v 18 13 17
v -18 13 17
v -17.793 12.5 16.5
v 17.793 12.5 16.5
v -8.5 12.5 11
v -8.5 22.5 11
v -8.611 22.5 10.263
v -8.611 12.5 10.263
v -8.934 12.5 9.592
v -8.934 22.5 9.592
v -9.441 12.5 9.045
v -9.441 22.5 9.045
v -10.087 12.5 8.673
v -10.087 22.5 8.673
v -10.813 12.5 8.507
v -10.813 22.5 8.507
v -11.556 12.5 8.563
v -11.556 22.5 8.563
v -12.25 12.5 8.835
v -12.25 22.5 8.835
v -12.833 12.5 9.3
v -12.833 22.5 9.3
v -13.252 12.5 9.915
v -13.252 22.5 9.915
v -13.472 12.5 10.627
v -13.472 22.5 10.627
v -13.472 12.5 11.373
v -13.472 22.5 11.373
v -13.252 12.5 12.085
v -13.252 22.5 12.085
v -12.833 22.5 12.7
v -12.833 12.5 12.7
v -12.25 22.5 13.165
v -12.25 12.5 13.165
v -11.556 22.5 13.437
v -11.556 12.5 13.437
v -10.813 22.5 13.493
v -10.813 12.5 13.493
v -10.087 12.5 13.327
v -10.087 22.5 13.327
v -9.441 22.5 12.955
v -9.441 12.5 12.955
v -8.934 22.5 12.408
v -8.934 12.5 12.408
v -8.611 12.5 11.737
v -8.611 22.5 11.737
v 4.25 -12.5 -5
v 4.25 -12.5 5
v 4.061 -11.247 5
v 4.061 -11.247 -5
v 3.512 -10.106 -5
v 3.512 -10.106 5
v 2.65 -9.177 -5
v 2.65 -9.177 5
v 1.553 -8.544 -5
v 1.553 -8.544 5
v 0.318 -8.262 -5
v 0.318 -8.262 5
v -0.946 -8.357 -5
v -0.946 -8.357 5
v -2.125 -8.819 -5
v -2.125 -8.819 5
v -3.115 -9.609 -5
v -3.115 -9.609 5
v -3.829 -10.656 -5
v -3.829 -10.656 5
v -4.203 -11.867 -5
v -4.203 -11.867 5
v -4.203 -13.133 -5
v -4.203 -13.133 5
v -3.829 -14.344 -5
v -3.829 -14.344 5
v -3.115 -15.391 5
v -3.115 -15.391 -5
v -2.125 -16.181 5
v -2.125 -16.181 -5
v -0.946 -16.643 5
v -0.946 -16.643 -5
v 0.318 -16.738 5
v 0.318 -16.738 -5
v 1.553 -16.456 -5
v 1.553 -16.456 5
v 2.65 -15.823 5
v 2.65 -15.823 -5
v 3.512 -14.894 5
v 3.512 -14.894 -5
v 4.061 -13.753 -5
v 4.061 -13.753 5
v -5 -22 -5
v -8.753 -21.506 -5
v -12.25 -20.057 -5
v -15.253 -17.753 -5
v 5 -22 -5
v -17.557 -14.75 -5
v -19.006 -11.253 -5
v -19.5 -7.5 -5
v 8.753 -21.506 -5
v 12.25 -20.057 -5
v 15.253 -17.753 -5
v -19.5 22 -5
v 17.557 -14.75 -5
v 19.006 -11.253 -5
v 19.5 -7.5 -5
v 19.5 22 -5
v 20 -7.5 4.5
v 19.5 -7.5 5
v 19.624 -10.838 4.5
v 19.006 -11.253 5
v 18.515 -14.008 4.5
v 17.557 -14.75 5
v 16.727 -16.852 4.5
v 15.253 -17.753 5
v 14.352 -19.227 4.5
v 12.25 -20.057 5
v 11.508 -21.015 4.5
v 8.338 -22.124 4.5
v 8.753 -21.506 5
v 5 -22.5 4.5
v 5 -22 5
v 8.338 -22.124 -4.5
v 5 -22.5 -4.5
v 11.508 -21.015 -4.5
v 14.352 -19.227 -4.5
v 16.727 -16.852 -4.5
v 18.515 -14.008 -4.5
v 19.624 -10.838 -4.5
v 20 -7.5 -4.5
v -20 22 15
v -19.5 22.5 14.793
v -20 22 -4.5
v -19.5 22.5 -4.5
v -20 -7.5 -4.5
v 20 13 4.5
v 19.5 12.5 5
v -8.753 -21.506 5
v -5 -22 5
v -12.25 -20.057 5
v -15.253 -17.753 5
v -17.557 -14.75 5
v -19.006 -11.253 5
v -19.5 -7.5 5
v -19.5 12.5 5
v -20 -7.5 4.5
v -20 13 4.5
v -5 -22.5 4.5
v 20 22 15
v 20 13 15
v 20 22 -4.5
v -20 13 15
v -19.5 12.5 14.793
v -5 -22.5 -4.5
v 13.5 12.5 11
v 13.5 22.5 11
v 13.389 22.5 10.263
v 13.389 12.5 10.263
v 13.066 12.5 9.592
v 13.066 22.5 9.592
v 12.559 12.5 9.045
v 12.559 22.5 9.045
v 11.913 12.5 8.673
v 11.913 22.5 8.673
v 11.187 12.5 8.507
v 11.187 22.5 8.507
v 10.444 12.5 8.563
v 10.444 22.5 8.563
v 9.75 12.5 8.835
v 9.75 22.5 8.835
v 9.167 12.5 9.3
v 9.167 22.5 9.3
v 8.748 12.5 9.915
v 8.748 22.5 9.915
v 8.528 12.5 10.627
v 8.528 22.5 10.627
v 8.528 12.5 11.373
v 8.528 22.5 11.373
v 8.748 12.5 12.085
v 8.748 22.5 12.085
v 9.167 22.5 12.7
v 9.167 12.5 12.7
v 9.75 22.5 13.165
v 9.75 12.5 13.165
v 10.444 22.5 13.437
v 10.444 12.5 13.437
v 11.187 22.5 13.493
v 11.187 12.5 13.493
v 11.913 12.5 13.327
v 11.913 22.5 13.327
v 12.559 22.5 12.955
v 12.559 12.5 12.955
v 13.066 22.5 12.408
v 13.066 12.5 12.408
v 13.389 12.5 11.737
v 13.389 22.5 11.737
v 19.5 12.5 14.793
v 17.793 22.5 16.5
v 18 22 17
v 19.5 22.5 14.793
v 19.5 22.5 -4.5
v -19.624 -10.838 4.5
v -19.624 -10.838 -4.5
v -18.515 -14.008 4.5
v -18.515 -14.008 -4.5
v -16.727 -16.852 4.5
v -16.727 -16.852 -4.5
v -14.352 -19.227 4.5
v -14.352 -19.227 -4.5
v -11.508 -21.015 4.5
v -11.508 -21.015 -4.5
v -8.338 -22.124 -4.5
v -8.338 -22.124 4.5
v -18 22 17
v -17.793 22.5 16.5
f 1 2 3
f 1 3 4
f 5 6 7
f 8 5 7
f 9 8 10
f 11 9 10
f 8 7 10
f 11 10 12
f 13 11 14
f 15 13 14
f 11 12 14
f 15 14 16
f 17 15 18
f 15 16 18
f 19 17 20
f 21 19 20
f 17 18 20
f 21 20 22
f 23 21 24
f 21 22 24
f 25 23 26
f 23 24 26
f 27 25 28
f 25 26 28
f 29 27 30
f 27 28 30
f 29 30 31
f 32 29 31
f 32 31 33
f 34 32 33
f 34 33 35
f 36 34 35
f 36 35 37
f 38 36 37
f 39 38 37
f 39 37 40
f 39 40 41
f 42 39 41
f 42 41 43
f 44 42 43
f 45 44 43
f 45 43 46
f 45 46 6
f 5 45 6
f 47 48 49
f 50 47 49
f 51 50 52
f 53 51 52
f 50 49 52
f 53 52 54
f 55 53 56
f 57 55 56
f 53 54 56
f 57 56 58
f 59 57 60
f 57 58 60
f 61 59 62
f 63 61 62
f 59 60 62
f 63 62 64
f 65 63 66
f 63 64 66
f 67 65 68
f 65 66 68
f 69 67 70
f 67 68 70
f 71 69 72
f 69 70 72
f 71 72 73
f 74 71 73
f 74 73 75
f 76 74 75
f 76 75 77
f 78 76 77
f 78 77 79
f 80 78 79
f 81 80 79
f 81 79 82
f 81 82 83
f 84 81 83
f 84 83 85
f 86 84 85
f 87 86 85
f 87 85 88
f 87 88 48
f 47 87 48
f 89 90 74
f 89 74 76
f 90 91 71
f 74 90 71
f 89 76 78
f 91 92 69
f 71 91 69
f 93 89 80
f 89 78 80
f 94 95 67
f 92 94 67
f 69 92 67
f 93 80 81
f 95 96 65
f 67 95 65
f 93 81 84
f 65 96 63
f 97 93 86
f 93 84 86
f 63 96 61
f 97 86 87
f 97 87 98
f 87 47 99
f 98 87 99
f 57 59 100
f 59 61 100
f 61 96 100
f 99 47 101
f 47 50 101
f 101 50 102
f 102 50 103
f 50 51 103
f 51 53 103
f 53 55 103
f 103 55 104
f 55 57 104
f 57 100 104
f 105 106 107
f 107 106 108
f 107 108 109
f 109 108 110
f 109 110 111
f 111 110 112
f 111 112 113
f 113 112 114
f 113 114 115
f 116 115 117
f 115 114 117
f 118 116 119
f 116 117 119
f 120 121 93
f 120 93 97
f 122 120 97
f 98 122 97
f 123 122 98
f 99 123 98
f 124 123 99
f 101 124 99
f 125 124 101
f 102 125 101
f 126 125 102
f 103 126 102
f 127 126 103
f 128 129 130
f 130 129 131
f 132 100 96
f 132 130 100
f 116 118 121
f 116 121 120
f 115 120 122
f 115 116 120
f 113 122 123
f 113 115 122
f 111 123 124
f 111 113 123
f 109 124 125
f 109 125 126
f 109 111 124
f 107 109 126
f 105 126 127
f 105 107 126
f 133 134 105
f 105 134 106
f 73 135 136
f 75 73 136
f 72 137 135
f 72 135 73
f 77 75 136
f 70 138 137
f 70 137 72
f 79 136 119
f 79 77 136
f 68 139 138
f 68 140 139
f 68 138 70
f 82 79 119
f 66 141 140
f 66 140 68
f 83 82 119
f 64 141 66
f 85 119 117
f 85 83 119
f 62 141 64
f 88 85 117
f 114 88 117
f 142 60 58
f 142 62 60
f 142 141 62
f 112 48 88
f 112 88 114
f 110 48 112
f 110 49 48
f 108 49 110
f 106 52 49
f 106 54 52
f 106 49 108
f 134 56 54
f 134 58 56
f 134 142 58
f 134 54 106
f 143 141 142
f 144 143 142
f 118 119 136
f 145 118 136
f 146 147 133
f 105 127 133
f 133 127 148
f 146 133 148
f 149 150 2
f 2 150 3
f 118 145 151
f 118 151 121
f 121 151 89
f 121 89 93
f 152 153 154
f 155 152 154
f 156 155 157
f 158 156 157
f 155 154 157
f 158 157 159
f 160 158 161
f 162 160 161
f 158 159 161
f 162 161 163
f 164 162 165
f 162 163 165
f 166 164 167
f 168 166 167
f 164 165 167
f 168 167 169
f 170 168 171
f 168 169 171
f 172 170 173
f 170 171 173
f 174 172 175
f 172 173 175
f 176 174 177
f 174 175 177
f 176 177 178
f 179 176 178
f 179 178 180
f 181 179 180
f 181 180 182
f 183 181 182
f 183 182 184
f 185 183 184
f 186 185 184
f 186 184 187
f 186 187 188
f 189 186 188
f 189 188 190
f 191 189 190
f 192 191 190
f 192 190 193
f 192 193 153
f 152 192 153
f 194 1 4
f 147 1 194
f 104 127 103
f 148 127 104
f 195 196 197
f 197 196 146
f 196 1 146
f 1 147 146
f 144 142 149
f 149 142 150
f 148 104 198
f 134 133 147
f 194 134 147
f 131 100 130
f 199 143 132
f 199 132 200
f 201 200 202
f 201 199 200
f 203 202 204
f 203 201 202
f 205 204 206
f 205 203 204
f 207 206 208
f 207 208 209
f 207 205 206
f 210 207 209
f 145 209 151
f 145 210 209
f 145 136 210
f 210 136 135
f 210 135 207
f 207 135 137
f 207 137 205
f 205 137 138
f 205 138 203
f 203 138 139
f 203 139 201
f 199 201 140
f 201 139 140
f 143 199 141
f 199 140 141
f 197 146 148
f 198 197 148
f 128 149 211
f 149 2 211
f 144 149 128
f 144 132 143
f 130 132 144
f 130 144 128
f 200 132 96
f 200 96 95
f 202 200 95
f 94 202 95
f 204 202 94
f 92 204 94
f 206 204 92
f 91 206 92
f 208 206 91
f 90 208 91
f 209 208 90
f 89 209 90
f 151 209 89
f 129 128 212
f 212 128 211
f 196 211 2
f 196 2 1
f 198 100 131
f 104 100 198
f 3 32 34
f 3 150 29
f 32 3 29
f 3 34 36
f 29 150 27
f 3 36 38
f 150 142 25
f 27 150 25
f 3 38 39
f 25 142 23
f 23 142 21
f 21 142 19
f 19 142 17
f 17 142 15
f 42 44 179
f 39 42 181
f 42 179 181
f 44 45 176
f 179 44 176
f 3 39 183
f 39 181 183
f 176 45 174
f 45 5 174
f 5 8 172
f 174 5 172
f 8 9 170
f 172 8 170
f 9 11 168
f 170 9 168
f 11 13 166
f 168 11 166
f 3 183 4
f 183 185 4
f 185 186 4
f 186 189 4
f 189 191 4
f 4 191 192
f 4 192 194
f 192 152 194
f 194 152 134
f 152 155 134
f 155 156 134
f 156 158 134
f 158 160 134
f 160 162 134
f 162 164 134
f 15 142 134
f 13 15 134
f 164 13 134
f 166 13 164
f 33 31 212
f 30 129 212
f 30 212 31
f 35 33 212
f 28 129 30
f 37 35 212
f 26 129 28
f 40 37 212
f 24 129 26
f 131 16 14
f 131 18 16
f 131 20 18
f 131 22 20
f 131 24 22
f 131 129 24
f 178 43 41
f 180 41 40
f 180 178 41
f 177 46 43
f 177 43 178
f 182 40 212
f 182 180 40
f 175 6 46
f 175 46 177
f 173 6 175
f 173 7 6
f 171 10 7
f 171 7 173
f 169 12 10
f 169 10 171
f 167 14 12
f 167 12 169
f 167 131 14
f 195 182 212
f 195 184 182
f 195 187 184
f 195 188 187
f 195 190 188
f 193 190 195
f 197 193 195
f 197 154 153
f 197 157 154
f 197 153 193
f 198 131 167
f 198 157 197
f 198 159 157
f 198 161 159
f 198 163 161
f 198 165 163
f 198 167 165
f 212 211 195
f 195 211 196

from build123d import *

# Parameters (mm, degrees)
SKETCH_1_W          = 40
SKETCH_1_H          = 45
EXTRUDE_1_DEPTH     = 5
SKETCH_2_W          = 40
SKETCH_2_H          = 10
EXTRUDE_2_DEPTH     = 12
HOLE_WIZARD_M10_1_D = 8.5
HOLE_WIZARD_M6_1_D  = 5
FILLET_1_R          = 15
CHAMFER_1_SIZE      = 2
CHAMFER_2_SIZE      = 0.5


with BuildPart() as part:
    # 草图1 → 凸台-拉伸1 (new, symmetric)
    with BuildSketch(Plane.XY):
        Rectangle(SKETCH_1_W, SKETCH_1_H)
    extrude(amount=EXTRUDE_1_DEPTH, both=True)

    # 草图2 → 凸台-拉伸2 (add)
    with BuildSketch(Plane.XY.offset(5)):
        with Locations((0, 17.5)):
            Rectangle(SKETCH_2_W, SKETCH_2_H)
    extrude(amount=EXTRUDE_2_DEPTH)

    # M10 螺纹孔1 (through all)
    with Locations(Plane(origin=(0, 0, -5), x_dir=(-1, 0, 0), z_dir=(0, 0, -1))):
        with Locations((0, -12.5)):
            Hole(HOLE_WIZARD_M10_1_D / 2)

    # M6 螺纹孔1 (through all)
    with Locations(Plane(origin=(0, 12.5, 0), x_dir=(-1, 0, 0), z_dir=(0, -1, 0))):
        with Locations((-11, -11), (11, -11)):
            Hole(HOLE_WIZARD_M6_1_D / 2)

    # 圆角1
    fillet_1_edges = [part.edges().sort_by_distance(p)[0] for p in [
        (20, -22.5, 0),
        (-20, -22.5, 0),
    ]]
    fillet(fillet_1_edges, radius=FILLET_1_R)

    # 倒角1
    chamfer_1_edges = [part.edges().sort_by_distance(p)[0] for p in [
        (-20, 17.5, 17),
        (20, 17.5, 17),
    ]]
    chamfer(chamfer_1_edges, length=CHAMFER_1_SIZE)

    # 倒角2
    chamfer_2_edges = [part.edges().sort_by_distance(p)[0] for p in [
        (-20, 2.5, 5),
        (0, -22.5, -5),
        (0, -22.5, 5),
        (20, 7.5, -5),
        (15.606601718, -18.106601718, -5),
        (-15.606601718, -18.106601718, -5),
        (20, 2.5, 5),
        (15.606601718, -18.106601718, 5),
        (-15.606601718, -18.106601718, 5),
        (-20, 7.5, -5),
        (0, 22.5, -5),
        (0, 12.5, 17),
        (0, 22.5, 17),
        (20, 12.5, 10),
        (-20, 12.5, 10),
        (19, 12.5, 16),
        (-19, 12.5, 16),
        (-20, 22.5, 5),
        (20, 22.5, 5),
        (19, 22.5, 16),
        (-19, 22.5, 16),
    ]]
    chamfer(chamfer_2_edges, length=CHAMFER_2_SIZE)


solid = part.part
